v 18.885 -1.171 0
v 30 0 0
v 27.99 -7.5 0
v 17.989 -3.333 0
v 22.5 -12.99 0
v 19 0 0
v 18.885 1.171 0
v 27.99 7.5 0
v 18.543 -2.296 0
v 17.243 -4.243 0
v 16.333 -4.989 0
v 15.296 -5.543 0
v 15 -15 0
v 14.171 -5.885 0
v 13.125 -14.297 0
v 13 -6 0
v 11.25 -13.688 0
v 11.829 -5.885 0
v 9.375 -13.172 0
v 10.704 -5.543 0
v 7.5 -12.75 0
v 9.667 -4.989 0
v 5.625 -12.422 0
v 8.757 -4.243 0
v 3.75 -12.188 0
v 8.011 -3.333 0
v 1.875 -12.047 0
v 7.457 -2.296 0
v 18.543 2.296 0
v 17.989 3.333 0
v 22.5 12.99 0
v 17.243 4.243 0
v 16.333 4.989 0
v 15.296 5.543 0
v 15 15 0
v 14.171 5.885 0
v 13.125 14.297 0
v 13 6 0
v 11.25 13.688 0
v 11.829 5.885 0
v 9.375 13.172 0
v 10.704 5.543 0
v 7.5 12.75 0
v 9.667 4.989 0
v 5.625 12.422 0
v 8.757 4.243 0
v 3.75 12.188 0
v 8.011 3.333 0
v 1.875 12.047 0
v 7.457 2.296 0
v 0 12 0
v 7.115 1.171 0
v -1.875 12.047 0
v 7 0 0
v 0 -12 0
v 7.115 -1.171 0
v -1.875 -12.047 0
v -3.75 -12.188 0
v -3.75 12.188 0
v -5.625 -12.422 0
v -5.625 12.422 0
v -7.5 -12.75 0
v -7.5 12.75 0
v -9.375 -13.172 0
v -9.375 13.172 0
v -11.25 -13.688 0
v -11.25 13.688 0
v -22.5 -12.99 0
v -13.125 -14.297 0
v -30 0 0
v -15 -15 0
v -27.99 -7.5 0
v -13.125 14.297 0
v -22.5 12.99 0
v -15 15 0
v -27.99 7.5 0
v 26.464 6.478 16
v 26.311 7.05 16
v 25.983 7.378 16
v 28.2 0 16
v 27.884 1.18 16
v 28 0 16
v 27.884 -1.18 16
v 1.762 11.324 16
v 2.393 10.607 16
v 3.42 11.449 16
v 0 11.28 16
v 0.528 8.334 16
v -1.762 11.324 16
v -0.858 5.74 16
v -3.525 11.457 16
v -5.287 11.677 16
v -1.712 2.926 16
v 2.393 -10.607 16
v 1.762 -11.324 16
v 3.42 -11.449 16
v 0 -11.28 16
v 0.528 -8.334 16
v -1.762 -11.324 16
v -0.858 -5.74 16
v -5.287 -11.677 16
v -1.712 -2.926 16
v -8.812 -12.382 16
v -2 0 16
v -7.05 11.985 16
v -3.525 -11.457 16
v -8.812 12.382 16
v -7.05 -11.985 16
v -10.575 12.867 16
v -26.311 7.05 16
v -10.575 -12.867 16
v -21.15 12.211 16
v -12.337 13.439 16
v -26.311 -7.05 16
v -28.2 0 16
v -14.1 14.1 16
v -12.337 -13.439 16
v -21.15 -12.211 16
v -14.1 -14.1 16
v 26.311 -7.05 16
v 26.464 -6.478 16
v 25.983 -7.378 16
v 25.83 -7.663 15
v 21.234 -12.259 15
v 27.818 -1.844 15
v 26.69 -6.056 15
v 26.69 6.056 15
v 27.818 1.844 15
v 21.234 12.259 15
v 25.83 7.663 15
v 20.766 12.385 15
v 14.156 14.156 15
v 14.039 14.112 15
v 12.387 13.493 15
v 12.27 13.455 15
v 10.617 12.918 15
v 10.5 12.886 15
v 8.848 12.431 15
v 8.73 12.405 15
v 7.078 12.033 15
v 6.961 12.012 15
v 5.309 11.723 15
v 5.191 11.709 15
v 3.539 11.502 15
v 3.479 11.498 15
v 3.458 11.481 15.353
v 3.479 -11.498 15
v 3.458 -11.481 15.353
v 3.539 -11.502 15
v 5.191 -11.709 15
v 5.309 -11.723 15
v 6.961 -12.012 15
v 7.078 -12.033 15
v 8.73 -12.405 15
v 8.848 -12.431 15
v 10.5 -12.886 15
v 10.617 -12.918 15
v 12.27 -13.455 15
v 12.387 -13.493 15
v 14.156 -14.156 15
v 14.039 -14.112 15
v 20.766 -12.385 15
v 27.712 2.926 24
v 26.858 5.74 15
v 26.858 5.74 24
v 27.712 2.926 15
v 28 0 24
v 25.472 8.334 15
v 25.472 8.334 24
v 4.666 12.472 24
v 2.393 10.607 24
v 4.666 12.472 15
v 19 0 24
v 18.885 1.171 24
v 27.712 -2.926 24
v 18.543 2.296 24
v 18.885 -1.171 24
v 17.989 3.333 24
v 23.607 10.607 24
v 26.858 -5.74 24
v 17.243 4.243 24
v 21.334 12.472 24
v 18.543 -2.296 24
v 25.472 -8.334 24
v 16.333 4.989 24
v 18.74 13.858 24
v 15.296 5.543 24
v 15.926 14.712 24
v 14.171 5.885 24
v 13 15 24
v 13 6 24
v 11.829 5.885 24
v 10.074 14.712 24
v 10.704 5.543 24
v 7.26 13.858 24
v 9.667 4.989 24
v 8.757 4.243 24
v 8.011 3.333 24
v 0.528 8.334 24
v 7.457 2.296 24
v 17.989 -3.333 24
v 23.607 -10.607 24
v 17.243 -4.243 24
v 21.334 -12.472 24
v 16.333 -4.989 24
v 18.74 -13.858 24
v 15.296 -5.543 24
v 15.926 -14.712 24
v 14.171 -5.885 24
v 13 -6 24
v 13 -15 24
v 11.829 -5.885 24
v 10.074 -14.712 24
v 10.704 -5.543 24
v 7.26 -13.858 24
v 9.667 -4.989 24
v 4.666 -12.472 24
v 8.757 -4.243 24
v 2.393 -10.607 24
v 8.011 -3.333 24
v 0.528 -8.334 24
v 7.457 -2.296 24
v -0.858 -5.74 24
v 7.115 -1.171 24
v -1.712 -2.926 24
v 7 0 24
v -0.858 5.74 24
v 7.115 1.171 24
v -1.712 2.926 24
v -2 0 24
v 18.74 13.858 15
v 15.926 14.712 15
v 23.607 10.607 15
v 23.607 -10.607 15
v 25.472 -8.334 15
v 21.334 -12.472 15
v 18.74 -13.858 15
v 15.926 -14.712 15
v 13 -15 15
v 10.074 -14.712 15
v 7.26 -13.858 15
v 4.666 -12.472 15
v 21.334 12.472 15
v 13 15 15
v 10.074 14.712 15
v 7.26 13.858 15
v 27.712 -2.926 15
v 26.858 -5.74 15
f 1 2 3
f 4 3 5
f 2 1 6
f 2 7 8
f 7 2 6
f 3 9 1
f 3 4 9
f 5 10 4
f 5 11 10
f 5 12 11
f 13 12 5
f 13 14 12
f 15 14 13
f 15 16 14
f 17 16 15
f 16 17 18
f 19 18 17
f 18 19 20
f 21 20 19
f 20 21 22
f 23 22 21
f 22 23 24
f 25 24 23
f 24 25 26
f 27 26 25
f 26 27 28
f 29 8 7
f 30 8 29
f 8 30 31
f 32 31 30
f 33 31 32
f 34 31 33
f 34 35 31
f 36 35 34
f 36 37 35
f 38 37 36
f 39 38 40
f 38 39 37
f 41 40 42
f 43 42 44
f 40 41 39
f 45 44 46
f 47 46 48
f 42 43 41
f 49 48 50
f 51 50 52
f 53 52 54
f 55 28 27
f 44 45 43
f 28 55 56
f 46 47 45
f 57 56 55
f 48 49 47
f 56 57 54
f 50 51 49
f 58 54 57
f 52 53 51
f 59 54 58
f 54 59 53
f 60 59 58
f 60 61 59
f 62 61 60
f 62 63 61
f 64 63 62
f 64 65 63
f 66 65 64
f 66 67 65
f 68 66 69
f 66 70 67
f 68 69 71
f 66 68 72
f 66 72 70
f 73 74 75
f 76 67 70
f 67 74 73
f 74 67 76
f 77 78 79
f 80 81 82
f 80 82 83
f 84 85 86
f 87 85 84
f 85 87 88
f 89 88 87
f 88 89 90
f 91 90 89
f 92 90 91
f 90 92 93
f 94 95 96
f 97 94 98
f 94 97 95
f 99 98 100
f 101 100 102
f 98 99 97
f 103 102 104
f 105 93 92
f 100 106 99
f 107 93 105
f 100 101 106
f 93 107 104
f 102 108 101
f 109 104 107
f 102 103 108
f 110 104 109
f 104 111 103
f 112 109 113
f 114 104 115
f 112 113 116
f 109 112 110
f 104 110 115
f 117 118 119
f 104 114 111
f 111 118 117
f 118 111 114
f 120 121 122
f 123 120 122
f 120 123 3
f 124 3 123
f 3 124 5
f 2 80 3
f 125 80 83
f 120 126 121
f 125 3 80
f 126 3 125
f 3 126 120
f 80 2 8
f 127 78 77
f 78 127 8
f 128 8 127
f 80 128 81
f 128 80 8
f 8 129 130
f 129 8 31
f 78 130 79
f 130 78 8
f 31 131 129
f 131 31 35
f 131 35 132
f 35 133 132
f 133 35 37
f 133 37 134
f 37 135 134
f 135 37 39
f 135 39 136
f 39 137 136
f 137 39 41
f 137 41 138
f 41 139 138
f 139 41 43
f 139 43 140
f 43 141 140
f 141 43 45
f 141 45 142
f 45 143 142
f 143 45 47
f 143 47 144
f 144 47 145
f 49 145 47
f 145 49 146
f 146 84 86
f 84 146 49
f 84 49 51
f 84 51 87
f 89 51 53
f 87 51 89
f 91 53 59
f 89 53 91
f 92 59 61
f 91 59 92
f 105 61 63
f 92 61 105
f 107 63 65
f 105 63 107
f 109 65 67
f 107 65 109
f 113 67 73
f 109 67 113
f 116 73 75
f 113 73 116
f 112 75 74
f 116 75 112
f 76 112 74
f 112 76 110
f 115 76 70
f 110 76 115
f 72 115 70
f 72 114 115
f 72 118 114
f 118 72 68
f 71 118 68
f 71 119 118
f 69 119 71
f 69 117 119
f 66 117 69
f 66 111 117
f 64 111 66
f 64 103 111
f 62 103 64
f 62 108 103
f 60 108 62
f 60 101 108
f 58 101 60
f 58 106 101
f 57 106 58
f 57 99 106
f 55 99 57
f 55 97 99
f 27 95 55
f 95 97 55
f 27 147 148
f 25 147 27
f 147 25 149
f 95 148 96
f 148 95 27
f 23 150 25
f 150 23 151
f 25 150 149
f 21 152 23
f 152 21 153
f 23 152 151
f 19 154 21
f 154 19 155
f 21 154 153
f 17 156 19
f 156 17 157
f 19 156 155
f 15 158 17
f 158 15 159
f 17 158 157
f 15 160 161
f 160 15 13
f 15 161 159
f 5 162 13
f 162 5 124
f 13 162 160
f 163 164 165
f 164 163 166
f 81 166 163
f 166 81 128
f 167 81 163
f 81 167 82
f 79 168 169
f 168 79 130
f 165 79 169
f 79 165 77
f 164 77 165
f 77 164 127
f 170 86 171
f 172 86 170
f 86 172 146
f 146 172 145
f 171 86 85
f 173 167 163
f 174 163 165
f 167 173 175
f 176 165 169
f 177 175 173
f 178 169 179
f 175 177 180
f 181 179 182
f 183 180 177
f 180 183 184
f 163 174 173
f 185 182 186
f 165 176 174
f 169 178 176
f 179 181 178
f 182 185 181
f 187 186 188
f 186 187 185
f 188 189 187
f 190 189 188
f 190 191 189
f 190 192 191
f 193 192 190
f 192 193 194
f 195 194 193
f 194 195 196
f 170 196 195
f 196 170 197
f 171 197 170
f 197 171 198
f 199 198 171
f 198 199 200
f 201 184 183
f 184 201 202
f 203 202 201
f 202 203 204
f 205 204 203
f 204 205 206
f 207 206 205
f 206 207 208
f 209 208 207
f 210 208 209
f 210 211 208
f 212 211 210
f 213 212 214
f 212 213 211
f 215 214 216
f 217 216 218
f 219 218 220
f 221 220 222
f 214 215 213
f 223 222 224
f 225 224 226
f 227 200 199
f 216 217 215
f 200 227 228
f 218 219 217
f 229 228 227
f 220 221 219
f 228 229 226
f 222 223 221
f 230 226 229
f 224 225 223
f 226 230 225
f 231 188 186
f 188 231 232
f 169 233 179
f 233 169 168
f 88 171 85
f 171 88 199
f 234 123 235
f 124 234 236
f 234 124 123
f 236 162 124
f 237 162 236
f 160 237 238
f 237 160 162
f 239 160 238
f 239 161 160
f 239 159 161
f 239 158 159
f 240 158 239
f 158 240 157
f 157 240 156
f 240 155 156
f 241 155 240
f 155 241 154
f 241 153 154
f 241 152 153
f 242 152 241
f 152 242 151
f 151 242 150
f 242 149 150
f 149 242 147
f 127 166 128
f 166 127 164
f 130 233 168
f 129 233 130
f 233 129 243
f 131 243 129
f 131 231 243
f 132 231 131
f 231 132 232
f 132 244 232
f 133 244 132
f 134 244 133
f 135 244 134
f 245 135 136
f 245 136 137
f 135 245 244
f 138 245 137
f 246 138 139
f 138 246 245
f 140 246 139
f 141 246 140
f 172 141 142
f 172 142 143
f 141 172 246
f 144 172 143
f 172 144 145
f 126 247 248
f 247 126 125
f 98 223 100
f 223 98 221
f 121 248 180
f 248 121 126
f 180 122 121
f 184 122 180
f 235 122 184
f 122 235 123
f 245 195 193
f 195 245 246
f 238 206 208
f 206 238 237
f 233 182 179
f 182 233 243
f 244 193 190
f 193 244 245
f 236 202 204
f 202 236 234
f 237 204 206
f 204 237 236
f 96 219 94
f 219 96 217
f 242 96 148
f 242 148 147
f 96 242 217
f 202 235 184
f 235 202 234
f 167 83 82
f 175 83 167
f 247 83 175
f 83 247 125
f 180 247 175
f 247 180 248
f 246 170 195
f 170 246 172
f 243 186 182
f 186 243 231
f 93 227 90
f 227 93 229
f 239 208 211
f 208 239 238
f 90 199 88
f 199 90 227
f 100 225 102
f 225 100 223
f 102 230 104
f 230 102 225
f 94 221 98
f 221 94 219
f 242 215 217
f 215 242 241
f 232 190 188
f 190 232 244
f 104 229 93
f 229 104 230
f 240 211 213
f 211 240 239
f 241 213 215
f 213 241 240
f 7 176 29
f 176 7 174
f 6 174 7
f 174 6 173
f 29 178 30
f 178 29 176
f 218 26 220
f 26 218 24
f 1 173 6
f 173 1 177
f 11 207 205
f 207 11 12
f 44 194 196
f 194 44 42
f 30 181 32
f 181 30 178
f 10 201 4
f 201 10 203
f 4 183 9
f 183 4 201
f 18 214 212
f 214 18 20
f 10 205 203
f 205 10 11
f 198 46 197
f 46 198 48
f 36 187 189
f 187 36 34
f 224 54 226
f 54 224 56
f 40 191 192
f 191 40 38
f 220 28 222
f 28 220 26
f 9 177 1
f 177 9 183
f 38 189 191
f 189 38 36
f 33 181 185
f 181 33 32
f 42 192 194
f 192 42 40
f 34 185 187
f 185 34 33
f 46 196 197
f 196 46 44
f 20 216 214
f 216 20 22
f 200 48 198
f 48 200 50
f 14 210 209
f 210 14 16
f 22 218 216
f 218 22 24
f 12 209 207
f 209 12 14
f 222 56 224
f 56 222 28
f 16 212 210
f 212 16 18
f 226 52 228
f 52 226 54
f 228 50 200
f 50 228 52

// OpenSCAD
$fn = 32;

// ----------------------------------------------------------------------
// Handle: 60 x 30 mm grip, 16 mm thick
// ----------------------------------------------------------------------

// --- parameters (mm) ---
length = 60;              // grip length
width = 30;               // grip width
thickness = 16;           // grip thickness
waist = 0.8;              // width factor at the middle
draft = 0.94;             // top face scale of the extrusion
boss_d = 30;              // mounting boss diameter
boss_h = 8;               // mounting boss height
boss_hole_d = 12;         // screw clearance through the boss
boss_r = 13;              // boss centre from the grip centre

/* ergonomic grip outline, closed spline-like polygon in the XY plane */
grip = [[-15, 15], [-13.125, 14.297], [-11.25, 13.688], [-9.375, 13.172], [-7.5, 12.75], [-5.625, 12.422], [-3.75, 12.188], [-1.875, 12.047], [0, 12], [1.875, 12.047], [3.75, 12.188], [5.625, 12.422], [7.5, 12.75], [9.375, 13.172], [11.25, 13.688], [13.125, 14.297], [15, 15], [22.5, 12.99], [27.99, 7.5], [30, 0], [27.99, -7.5], [22.5, -12.99], [15, -15], [15, -15], [13.125, -14.297], [11.25, -13.688], [9.375, -13.172], [7.5, -12.75], [5.625, -12.422], [3.75, -12.188], [1.875, -12.047], [0, -12], [-1.875, -12.047], [-3.75, -12.188], [-5.625, -12.422], [-7.5, -12.75], [-9.375, -13.172], [-11.25, -13.688], [-13.125, -14.297], [-15, -15], [-22.5, -12.99], [-27.99, -7.5], [-30, 0], [-27.99, 7.5], [-22.5, 12.99], [-15, 15]];

module grip_body() {
  linear_extrude(height = thickness, scale = draft) polygon(grip);
}

module boss_body() {
  /* sunk 1 mm into the grip so the joint overlaps */
  translate([boss_r, 0, thickness - 1]) cylinder(h = boss_h + 1, d = boss_d);
}

difference() {
  union() {
    grip_body();
    boss_body();
  }
  translate([boss_r, 0, -1]) cylinder(h = thickness + boss_h + 2, d = boss_hole_d);
}
